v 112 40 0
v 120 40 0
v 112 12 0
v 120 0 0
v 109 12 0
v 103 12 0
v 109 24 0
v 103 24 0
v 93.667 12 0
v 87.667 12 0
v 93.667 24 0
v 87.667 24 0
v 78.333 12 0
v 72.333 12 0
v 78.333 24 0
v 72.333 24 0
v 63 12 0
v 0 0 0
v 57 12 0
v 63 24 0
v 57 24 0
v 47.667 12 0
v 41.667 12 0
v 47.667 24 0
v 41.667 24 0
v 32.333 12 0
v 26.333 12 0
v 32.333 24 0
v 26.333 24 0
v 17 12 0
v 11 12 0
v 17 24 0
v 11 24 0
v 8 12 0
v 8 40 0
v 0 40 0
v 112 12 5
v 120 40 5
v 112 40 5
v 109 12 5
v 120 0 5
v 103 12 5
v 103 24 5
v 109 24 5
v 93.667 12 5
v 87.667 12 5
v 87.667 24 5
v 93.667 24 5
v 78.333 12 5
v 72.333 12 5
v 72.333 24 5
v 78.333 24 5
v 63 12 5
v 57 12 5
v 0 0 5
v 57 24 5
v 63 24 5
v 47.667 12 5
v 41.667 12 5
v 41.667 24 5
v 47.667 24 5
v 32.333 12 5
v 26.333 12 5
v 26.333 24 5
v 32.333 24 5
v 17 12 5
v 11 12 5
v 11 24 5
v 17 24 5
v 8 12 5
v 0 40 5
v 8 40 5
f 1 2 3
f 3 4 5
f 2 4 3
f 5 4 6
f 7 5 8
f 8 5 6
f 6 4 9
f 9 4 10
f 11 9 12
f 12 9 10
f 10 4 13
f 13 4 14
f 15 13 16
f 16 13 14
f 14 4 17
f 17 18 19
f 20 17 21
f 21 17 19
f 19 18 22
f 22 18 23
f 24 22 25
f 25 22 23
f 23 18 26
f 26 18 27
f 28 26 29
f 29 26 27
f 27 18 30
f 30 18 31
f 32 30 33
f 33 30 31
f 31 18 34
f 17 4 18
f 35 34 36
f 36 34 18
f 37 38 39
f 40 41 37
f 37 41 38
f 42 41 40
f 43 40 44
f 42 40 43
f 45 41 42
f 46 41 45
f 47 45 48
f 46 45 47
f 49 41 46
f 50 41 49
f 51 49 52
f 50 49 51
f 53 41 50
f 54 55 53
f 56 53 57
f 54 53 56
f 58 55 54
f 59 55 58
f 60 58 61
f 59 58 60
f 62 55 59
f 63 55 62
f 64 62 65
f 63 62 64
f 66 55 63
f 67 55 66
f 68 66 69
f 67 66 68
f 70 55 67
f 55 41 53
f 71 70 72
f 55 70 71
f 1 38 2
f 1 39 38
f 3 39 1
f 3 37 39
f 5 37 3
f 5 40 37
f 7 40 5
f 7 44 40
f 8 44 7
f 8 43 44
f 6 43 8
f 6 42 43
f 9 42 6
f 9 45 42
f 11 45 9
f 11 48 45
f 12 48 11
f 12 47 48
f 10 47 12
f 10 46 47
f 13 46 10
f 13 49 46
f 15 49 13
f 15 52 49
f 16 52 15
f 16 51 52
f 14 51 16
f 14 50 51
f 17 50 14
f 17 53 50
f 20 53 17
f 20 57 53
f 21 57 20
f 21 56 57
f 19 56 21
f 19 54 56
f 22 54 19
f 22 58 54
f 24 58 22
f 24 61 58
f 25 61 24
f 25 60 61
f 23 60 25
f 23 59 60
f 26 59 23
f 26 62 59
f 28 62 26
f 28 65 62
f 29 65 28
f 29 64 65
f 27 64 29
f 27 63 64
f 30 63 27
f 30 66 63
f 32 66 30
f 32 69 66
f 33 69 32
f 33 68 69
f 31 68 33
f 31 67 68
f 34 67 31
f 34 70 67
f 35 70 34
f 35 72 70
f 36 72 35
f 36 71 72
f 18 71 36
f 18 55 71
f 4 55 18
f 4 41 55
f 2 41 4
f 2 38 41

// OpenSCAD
$fn = 32;

// ----------------------------------------------------------------------
// Guard grille: 7 slats over a 120 x 40 mm plate
// ----------------------------------------------------------------------

// --- parameters (mm) ---
profile_height = 5;       // extrusion height
profile_points = 36;      // points of the closed outline

profile = [[0, 0], [120, 0], [120, 40], [112, 40], [112, 12], [109, 12], [109, 24], [103, 24], [103, 12], [93.667, 12], [93.667, 24], [87.667, 24], [87.667, 12], [78.333, 12], [78.333, 24], [72.333, 24], [72.333, 12], [63, 12], [63, 24], [57, 24], [57, 12], [47.667, 12], [47.667, 24], [41.667, 24], [41.667, 12], [32.333, 12], [32.333, 24], [26.333, 24], [26.333, 12], [17, 12], [17, 24], [11, 24], [11, 12], [8, 12], [8, 40], [0, 40]];  // single closed polygon, 36 points, counter clockwise

// --- the one profile operation ---
linear_extrude(height = profile_height) polygon(points = profile);
